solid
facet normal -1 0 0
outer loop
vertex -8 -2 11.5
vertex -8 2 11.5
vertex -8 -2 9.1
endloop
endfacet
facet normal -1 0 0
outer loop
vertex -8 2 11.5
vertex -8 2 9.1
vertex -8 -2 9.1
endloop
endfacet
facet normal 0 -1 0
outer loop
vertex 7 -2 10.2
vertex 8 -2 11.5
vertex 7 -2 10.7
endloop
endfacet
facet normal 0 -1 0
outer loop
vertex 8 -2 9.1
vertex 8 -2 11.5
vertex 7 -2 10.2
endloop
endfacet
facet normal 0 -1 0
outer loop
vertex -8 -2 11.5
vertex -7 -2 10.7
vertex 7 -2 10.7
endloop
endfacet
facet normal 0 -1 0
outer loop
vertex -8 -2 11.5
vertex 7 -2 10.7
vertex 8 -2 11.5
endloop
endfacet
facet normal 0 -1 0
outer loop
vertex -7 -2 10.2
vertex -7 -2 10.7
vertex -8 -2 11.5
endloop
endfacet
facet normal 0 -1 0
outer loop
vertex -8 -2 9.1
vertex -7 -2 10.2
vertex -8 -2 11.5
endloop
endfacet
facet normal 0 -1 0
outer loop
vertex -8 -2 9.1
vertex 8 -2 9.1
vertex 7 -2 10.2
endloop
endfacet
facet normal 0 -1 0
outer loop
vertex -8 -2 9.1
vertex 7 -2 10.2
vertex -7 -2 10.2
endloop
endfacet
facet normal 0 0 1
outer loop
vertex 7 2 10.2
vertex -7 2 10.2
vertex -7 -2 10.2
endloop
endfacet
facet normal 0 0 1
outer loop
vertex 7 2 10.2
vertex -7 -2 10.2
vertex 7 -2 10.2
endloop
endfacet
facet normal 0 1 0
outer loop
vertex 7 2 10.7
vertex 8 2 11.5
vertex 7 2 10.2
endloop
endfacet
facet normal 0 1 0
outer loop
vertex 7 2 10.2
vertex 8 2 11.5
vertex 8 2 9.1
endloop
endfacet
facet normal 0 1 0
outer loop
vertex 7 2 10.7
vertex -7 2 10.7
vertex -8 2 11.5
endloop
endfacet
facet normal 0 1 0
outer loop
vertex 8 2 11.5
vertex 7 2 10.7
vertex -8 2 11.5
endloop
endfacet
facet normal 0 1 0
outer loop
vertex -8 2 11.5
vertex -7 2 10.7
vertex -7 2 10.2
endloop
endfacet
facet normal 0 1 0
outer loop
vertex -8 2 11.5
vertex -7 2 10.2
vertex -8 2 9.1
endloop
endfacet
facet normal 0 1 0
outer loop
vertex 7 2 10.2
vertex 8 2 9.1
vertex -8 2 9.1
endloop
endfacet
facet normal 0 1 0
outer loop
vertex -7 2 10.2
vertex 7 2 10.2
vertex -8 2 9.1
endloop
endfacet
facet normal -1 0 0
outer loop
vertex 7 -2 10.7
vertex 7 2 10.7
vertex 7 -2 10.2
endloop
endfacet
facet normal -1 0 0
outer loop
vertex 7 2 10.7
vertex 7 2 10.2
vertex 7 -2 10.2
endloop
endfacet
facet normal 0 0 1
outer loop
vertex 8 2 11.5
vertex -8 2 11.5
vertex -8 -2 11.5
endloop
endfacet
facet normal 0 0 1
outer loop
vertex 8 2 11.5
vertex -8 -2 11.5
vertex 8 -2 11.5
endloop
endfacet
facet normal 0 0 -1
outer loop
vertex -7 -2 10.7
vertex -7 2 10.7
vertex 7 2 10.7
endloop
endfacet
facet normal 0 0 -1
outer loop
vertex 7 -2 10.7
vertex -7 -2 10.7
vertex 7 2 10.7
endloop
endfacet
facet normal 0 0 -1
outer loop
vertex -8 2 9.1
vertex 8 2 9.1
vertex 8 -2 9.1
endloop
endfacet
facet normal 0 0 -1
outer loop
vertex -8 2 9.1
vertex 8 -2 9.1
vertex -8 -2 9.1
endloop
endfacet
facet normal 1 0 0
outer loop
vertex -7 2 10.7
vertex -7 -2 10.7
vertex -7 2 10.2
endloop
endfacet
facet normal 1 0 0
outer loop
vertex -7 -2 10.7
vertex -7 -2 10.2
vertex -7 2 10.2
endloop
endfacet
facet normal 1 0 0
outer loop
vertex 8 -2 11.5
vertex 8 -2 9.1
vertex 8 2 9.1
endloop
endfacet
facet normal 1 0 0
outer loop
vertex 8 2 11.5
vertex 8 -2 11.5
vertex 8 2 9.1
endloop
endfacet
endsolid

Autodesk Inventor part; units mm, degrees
ref_plane "YZ Plane" through (0, 0, 0) normal (1, 0, 0) x (0, 1, 0)
ref_plane "XZ Plane" through (0, 0, 0) normal (0, 1, 0) x (-1, 0, 0)
sketch "Sketch1" plane through (0, 0, 0) normal (0, 0, 1) x (1, 0, 0)
  line L0 (-8, -2) -> (8, -2)
  line L1 (8, -2) -> (8, 2)
  line L2 (8, 2) -> (-8, 2)
  line L3 (-8, 2) -> (-8, -2)
  point P0 (0, 0)
  dimension "d268" = 4
  dimension "d269" = 2
  dimension "d270" = 16
  dimension "d271" = 8
extrude "Extrusion1" add sketch "Sketch1" along normal blind 10.2
sketch "Sketch2" plane through (-6.98, -2.75, 0) normal (0, -1, 0) x (1, 0, 0)
  line L0 (0, 0) -> (13.96, 0) projected
  line L1 (5.18, 3.6) -> (8.78, 3.6)
  line L2 (8.78, 3.6) -> (8.78, 0.5)
  line L3 (8.28, 0) -> (5.68, 0)
  line L4 (5.18, 0.5) -> (5.18, 3.6)
  line L5 (5.18, 0.5) -> (5.68, 0)
  line L6 (8.78, 0.5) -> (8.28, 0)
  point P0 (6.98, 0)
  dimension "d15" = 3.6
  dimension "d17" = 0.5
  dimension "d19" = 135
  dimension "d20" = 135
  dimension "d21" = 0.5
  dimension "d22" = 3.6
extrude "Extrusion2" [suppressed]
sketch "Sketch3" plane through (0, 0, 0) normal (0, 1, 0) x (-1, 0, 0)
  line L0 (-6.98, 3.6) -> (-7.23, 3.6)
  line L1 (-7.98, 2.1) -> (-7.98, 1.22)
  line L2 (-7.98, 1.22) -> (-6.98, 1.22)
  line L3 (-6.98, 1.22) -> (-6.98, 3.6)
  line L4 (6.98, 10.2) -> (-6.98, 10.2) projected
  line L5 (0, 10.2) -> (0, 0)
  line L6 (-6.98, 0) -> (6.98, 0) projected
  line L7 (-7.23, 3.6) -> (-7.98, 2.1)
  line L8 (6.98, 3.6) -> (7.23, 3.6)
  line L9 (7.98, 2.1) -> (7.98, 1.22)
  line L10 (7.98, 1.22) -> (6.98, 1.22)
  line L11 (6.98, 1.22) -> (6.98, 3.6)
  line L12 (7.23, 3.6) -> (7.98, 2.1)
  dimension "d25" = 13.96
  dimension "d26" = 1.22
  dimension "d28" = 1
  dimension "d29" = 1.5
  dimension "d30" = 0.88
  dimension "d31" = 0.25
extrude "Extrusion3" [suppressed]
sketch "Sketch4" plane through (0, -0.5, 0) normal (0, -1, 0) x (1, 0, 0)
  line L0 (6.98, 3.6) -> (7.23, 3.6) projected
  line L1 (6.98, 6.263) -> (7.23, 6.263)
  line L2 (7.98, 5.513) -> (7.98, 5.263)
  line L3 (7.98, 5.263) -> (6.98, 5.263)
  line L4 (6.98, 5.263) -> (6.98, 6.263)
  line L5 (-6.98, 10.2) -> (6.98, 10.2) projected
  line L6 (6.98, 0) -> (-6.98, 0) projected
  line L7 (0, 10.2) -> (0, 0)
  line L8 (7.23, 6.263) -> (7.98, 5.513)
  line L9 (-6.98, 6.263) -> (-7.23, 6.263)
  line L10 (-7.98, 5.513) -> (-7.98, 5.263)
  line L11 (-7.98, 5.263) -> (-6.98, 5.263)
  line L12 (-6.98, 5.263) -> (-6.98, 6.263)
  line L13 (-7.23, 6.263) -> (-7.98, 5.513)
  dimension "d34" = 1.663
  dimension "d35" = 13.96
  dimension "d36" = 1
  dimension "d38" = 0.25
  dimension "d39" = 1
  dimension "d40" = 0.25
extrude "Extrusion4" [suppressed]
sketch "Sketch5" plane through (0, 0.5, 0) normal (0, 1, 0) x (1, 0, 0)
  line L0 (7.23, -3.6) -> (6.98, -3.6) projected
  line L1 (7.23, -6.263) -> (6.98, -6.263)
  line L2 (6.98, -6.263) -> (6.98, -5.263)
  line L3 (6.98, -5.263) -> (7.98, -5.263)
  line L4 (7.98, -5.263) -> (7.98, -5.513)
  line L5 (6.98, -10.2) -> (-6.98, -10.2) projected
  line L6 (1.3, 0) -> (-1.3, 0) projected
  line L7 (0, 0) -> (0, -10.2)
  line L8 (7.23, -6.263) -> (7.98, -5.513)
  line L9 (-7.23, -6.263) -> (-6.98, -6.263)
  line L10 (-6.98, -6.263) -> (-6.98, -5.263)
  line L11 (-6.98, -5.263) -> (-7.98, -5.263)
  line L12 (-7.98, -5.263) -> (-7.98, -5.513)
  line L13 (-7.23, -6.263) -> (-7.98, -5.513)
  dimension "d43" = 1.663
  dimension "d44" = 13.96
  dimension "d45" = 1
  dimension "d46" = 1
  dimension "d47" = 0.25
  dimension "d48" = 0.25
extrude "Extrusion5" [suppressed]
sketch "Sketch6" plane through (-6.98, -2.75, 10.2) normal (0, -1, 0) x (1, 0, 0)
  line L0 (0, -10.2) -> (5.68, -10.2) projected
  line L1 (-38.97, -10.2) -> (-36.97, -6.7359)
  line L2 (-36.97, -6.7359) -> (-34.97, -10.2)
  line L3 (-38.97, -10.2) -> (-34.97, -10.2)
  line L4 (0.5, -10.2) -> (2.5, -6.7359)
  line L5 (2.5, -6.7359) -> (4.5, -10.2)
  line L6 (0.5, -10.2) -> (4.5, -10.2)
  dimension "d61" = 0.5
  dimension "d62" = 4
extrude "Extrusion6" [suppressed]
sketch "Sketch7" plane through (0, 0, 0) normal (0, 0, -1) x (-1, 0, 0)
  line L0 (6.98, 2.75) -> (6.98, -1.25) projected
  line L1 (4.705, 1.645) -> (5.455, 1.645)
  line L2 (5.455, 1.645) -> (5.455, 0.895)
  line L3 (5.455, 0.895) -> (4.705, 0.895)
  line L4 (4.705, 0.895) -> (4.705, 1.645)
  line L5 (4.705, -0.895) -> (5.455, -0.895)
  line L6 (5.455, -0.895) -> (5.455, -1.645)
  line L7 (5.455, -1.645) -> (4.705, -1.645)
  line L8 (4.705, -1.645) -> (4.705, -0.895)
  line L9 (5.08, 0.895) -> (5.08, -0.895) construction
  point P0 (0, 0)
  point P1 (5.08, 0)
  dimension "d65" = 0.75
  dimension "d66" = 2.54
  dimension "d67" = 1.525
extrude "Extrusion7" [suppressed]
chamfer "Chamfer1" [suppressed]
pattern_linear "Rectangular Pattern1" [suppressed]
ref_plane "Work Plane1" through (0, 0, 10.7) normal (0, 0, 1) x (1, 0, 0)
sketch "Sketch8" plane through (0, 0, 10.7) normal (0, 0, 1) x (1, 0, 0)
  line L0 (-6.98, 2.75) -> (6.98, 2.75) projected
  line L1 (-6.98, -2.75) -> (-6.98, 2.75) projected
  line L2 (6.98, -2.75) -> (-6.98, -2.75) projected
  line L3 (6.98, 2.75) -> (6.98, -2.75) projected
  line L4 (-7.11, 0) -> (-42.9538, 0)
  line L5 (-8, -2) -> (-8, 2) projected
  line L6 (8, -2) -> (-8, -2) projected
  line L7 (8, 2) -> (8, -2) projected
  line L8 (-8, 2) -> (8, 2) projected
  line L9 (8, 2) -> (-8, 2) projected
  line L10 (8, -2) -> (-8, -2)
  line L11 (-8, -2) -> (-8, 2)
  line L12 (-8, 2) -> (8, 2)
  line L13 (8, 2) -> (8, -2)
extrude "Extrusion20" add sketch "Sketch8" along normal blind 0.8 contours L8 L3 L6 L1 | L1 L6 L5 L8 | L8 L7 L6 L3
sketch "Sketch22" plane through (0, 0, 0) normal (0, 0, -1) x (-1, 0, 0)
  line L0 (-7.99, -3) -> (-8.665, -3) projected
  line L1 (8.665, 2.75) -> (-8.665, 2.75) projected
  line L2 (-8.665, -3) -> (8.665, -3)
  line L3 (8.665, -3) -> (8.665, 2.75)
  line L4 (8.665, 2.75) -> (-8.665, 2.75)
  line L5 (-8.665, 2.75) -> (-8.665, -3)
  point P0 (0, 0)
extrude "Extrusion17" [suppressed]
sketch "Sketch25" plane through (0, 0, 0) normal (0, 0, -1) x (-1, 0, 0)
  line L0 (8, -2) -> (-8, -2) projected
  line L1 (8, 2) -> (8, -2) projected
  line L2 (-8, 2) -> (8, 2) projected
  line L3 (-8, -2) -> (-8, 2) projected
  line L4 (8, -2) -> (-8, -2)
  line L5 (-8, -2) -> (-8, 2)
  line L6 (-8, 2) -> (8, 2)
  line L7 (8, 2) -> (8, -2)
  point P0 (0, 0)
extrude "Extrusion21" cut sketch "Sketch25" against normal blind 9.1
sketch "Sketch26" plane through (0, 0, 10.2) normal (0, 0, 1) x (1, 0, 0)
  line L0 (8, -2) -> (-8, -2) projected
  line L1 (8, 2) -> (-8, 2) projected
  line L2 (-8, -2) -> (-7, -2)
  line L3 (-7, -2) -> (-7, 2)
  line L4 (-7, 2) -> (-8, 2)
  line L5 (-8, 2) -> (-8, -2)
  point P0 (0, 0)
  dimension "d276" = 1
extrude "Extrusion22" add sketch "Sketch26" along normal blind 0.5
mirror "Mirror1" about plane through (0, 0, 0) normal (1, 0, 0) of "Extrusion22"
equation "\"DimA\" = 13.96"
equation "\"DimB\" = 17.33"
equation "\"DimC\" = 5.715"
properties part number "Ribbon Cable Connector-02"
